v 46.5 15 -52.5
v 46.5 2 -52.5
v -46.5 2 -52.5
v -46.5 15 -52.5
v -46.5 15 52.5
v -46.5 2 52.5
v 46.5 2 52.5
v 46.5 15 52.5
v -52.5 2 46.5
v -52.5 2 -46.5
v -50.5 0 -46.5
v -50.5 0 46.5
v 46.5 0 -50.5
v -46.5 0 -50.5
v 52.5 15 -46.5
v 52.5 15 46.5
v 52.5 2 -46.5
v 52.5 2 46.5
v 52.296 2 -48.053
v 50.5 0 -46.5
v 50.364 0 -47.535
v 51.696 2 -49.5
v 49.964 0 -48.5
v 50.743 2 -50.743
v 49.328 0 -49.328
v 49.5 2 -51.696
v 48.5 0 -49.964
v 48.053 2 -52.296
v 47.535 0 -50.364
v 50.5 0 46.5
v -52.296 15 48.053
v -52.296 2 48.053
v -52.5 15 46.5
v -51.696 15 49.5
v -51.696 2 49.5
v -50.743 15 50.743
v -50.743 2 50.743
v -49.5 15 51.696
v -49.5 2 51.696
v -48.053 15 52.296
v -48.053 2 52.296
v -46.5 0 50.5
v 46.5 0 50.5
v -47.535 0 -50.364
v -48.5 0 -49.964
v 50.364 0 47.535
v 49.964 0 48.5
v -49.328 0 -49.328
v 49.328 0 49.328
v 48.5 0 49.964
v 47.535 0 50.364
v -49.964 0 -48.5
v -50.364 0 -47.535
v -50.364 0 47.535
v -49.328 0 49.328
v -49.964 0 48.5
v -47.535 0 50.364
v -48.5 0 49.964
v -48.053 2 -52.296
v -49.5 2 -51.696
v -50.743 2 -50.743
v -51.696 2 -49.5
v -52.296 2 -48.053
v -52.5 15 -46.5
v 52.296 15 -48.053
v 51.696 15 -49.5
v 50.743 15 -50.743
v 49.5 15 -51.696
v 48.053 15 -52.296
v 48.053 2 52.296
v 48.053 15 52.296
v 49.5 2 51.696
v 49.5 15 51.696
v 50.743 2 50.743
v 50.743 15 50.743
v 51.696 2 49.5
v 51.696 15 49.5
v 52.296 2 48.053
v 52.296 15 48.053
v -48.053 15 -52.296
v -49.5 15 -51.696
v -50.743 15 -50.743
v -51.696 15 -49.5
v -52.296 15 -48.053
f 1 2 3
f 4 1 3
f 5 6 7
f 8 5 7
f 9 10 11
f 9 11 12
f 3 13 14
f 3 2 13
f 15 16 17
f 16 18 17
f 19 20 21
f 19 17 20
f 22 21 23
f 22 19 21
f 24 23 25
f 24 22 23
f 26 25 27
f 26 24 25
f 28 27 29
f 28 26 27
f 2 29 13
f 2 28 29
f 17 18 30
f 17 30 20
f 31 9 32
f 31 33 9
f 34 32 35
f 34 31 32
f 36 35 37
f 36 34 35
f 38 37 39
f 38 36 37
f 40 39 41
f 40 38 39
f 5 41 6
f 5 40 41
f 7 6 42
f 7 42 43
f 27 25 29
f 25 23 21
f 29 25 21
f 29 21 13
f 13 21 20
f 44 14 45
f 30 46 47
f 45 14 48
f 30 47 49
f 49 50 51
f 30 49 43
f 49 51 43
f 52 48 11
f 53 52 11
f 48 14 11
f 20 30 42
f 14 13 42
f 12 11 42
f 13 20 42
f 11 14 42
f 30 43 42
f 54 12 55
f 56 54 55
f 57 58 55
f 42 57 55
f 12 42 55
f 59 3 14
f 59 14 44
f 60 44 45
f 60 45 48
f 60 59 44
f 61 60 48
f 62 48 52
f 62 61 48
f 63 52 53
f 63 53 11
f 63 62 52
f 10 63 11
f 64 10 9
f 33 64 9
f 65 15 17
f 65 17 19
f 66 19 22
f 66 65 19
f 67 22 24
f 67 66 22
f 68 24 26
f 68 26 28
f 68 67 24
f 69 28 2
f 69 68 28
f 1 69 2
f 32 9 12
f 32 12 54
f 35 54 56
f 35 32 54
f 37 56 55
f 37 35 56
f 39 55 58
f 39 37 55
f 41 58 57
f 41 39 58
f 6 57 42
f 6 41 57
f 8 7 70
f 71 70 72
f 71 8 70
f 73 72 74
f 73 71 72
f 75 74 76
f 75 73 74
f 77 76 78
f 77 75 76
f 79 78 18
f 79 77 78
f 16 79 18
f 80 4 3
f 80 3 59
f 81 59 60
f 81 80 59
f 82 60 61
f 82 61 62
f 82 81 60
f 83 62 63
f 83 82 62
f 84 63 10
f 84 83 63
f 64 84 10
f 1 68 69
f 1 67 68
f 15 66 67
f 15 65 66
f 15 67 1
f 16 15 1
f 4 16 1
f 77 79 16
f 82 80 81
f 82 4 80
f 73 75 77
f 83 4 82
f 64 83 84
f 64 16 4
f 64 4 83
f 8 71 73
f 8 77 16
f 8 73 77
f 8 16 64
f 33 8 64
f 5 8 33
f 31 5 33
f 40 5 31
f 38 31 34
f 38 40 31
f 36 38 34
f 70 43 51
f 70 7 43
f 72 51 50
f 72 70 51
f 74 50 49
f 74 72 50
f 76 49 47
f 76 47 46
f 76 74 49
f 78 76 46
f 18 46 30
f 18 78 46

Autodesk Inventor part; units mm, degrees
ref_plane "YZ Plane" through (0, 0, 0) normal (1, 0, 0) x (0, 1, 0)
ref_plane "XZ Plane" through (0, 0, 0) normal (0, 1, 0) x (-1, 0, 0)
ref_plane "XY Plane" through (0, 0, 0) normal (0, 0, 1) x (1, 0, 0)
sketch "Náčrt1" plane through (0, 0, 0) normal (0, 1, 0) x (-1, 0, 0)
  line L0 (52.5, 52.5) -> (-52.5, 52.5)
  line L1 (-52.5, 52.5) -> (-52.5, -52.5)
  line L2 (-52.5, -52.5) -> (52.5, -52.5)
  line L3 (52.5, -52.5) -> (52.5, 52.5)
  line L4 (52.5, 52.5) -> (0, 0) construction
  line L5 (0, 0) -> (52.5, -52.5) construction
  line L6 (0, 0) -> (-52.5, -52.5) construction
  dimension "d0" = 105
extrude "Vysunutí1" add sketch "Náčrt1" along normal blind 15
fillet "Zaoblení1" radius 6 4 edges at (52.5, 7.5, 52.5) (-52.5, 7.5, 52.5) (52.5, 7.5, -52.5) (-52.5, 7.5, -52.5)
chamfer "Zkosení1" distance 2 angle 45 8 edges at (52.5, 0, 0) (50.7426, 0, -50.7426) (0, 0, -52.5) (-50.7426, 0, -50.7426) (-52.5, 0, 0) (-50.7426, 0, 50.7426) (0, 0, 52.5) (50.7426, 0, 50.7426)
properties part number "top_insert"
